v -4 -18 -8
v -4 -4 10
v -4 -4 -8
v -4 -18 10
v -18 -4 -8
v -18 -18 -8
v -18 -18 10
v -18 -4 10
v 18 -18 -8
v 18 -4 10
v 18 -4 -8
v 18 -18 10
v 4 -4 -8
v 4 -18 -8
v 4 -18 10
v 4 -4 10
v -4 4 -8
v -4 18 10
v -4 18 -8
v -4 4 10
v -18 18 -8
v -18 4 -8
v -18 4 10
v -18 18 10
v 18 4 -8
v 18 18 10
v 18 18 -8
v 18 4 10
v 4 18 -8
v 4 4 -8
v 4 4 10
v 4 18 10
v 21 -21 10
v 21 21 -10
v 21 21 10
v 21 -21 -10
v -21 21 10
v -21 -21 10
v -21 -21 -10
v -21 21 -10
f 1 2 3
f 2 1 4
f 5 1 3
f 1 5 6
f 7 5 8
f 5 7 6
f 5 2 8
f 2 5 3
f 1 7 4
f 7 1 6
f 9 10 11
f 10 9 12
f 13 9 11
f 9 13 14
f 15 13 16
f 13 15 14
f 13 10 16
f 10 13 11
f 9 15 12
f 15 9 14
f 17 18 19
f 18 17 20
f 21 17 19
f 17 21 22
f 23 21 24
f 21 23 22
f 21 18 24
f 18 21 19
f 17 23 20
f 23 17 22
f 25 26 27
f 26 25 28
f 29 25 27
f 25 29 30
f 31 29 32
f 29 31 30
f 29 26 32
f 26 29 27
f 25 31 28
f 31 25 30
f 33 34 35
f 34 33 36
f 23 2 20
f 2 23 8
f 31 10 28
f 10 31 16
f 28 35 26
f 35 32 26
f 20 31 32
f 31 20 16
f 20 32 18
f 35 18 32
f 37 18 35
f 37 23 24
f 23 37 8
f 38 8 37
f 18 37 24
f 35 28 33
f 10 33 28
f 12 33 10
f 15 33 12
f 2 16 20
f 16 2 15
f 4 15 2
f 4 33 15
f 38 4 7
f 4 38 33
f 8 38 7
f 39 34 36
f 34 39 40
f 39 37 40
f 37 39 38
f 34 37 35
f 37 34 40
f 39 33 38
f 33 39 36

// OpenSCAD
$fn = 32;

// ----------------------------------------------------------------------
// Pocket plate 42 x 42 x 20
// 2 x 2 pockets 14 mm square, 18 mm deep
// ----------------------------------------------------------------------

// --- parameters (mm) ---
thickness = 20;  // plate thickness
floor_t = 2;     // material left under each pocket
pocket = 14;     // pocket side length
pitch_x = 22;    // pocket pitch along X
pitch_y = 22;    // pocket pitch along Y
cols = 2;        // pockets per row
rows = 2;        // rows of pockets

// --- derived feature positions (mm) ---
depth = thickness - floor_t;        // = 18   pocket depth, down to the floor
span_x = (cols - 1) * pitch_x;      // = 22   distance between outer pockets
span_y = (rows - 1) * pitch_y;      // = 22   distance between outer pocket rows
origin_x = -span_x / 2;             // = -11   X of the first pocket
origin_y = -span_y / 2;             // = -11   Y of the first pocket
plate = [span_x + pocket + 6, span_y + pocket + 6, thickness];  // = [42, 42, 20]   overall size: pockets plus 3 mm of wall on each side
feature_centers = [
  [origin_x + 0 * pitch_x, origin_y + 0 * pitch_y],
  [origin_x + 1 * pitch_x, origin_y + 0 * pitch_y],
  [origin_x + 0 * pitch_x, origin_y + 1 * pitch_y],
  [origin_x + 1 * pitch_x, origin_y + 1 * pitch_y]
];   // pocket centres, used verbatim by the cutter loop

// plate outline, then one pocket per centre in feature_centers
difference() {
  cube(plate, center = true);
  for (centre = feature_centers)
    translate([centre[0] - pocket / 2, centre[1] - pocket / 2, plate[2] / 2 - depth])
      cube([pocket, pocket, depth + 1]);  // centred on the declared pocket centre
}
